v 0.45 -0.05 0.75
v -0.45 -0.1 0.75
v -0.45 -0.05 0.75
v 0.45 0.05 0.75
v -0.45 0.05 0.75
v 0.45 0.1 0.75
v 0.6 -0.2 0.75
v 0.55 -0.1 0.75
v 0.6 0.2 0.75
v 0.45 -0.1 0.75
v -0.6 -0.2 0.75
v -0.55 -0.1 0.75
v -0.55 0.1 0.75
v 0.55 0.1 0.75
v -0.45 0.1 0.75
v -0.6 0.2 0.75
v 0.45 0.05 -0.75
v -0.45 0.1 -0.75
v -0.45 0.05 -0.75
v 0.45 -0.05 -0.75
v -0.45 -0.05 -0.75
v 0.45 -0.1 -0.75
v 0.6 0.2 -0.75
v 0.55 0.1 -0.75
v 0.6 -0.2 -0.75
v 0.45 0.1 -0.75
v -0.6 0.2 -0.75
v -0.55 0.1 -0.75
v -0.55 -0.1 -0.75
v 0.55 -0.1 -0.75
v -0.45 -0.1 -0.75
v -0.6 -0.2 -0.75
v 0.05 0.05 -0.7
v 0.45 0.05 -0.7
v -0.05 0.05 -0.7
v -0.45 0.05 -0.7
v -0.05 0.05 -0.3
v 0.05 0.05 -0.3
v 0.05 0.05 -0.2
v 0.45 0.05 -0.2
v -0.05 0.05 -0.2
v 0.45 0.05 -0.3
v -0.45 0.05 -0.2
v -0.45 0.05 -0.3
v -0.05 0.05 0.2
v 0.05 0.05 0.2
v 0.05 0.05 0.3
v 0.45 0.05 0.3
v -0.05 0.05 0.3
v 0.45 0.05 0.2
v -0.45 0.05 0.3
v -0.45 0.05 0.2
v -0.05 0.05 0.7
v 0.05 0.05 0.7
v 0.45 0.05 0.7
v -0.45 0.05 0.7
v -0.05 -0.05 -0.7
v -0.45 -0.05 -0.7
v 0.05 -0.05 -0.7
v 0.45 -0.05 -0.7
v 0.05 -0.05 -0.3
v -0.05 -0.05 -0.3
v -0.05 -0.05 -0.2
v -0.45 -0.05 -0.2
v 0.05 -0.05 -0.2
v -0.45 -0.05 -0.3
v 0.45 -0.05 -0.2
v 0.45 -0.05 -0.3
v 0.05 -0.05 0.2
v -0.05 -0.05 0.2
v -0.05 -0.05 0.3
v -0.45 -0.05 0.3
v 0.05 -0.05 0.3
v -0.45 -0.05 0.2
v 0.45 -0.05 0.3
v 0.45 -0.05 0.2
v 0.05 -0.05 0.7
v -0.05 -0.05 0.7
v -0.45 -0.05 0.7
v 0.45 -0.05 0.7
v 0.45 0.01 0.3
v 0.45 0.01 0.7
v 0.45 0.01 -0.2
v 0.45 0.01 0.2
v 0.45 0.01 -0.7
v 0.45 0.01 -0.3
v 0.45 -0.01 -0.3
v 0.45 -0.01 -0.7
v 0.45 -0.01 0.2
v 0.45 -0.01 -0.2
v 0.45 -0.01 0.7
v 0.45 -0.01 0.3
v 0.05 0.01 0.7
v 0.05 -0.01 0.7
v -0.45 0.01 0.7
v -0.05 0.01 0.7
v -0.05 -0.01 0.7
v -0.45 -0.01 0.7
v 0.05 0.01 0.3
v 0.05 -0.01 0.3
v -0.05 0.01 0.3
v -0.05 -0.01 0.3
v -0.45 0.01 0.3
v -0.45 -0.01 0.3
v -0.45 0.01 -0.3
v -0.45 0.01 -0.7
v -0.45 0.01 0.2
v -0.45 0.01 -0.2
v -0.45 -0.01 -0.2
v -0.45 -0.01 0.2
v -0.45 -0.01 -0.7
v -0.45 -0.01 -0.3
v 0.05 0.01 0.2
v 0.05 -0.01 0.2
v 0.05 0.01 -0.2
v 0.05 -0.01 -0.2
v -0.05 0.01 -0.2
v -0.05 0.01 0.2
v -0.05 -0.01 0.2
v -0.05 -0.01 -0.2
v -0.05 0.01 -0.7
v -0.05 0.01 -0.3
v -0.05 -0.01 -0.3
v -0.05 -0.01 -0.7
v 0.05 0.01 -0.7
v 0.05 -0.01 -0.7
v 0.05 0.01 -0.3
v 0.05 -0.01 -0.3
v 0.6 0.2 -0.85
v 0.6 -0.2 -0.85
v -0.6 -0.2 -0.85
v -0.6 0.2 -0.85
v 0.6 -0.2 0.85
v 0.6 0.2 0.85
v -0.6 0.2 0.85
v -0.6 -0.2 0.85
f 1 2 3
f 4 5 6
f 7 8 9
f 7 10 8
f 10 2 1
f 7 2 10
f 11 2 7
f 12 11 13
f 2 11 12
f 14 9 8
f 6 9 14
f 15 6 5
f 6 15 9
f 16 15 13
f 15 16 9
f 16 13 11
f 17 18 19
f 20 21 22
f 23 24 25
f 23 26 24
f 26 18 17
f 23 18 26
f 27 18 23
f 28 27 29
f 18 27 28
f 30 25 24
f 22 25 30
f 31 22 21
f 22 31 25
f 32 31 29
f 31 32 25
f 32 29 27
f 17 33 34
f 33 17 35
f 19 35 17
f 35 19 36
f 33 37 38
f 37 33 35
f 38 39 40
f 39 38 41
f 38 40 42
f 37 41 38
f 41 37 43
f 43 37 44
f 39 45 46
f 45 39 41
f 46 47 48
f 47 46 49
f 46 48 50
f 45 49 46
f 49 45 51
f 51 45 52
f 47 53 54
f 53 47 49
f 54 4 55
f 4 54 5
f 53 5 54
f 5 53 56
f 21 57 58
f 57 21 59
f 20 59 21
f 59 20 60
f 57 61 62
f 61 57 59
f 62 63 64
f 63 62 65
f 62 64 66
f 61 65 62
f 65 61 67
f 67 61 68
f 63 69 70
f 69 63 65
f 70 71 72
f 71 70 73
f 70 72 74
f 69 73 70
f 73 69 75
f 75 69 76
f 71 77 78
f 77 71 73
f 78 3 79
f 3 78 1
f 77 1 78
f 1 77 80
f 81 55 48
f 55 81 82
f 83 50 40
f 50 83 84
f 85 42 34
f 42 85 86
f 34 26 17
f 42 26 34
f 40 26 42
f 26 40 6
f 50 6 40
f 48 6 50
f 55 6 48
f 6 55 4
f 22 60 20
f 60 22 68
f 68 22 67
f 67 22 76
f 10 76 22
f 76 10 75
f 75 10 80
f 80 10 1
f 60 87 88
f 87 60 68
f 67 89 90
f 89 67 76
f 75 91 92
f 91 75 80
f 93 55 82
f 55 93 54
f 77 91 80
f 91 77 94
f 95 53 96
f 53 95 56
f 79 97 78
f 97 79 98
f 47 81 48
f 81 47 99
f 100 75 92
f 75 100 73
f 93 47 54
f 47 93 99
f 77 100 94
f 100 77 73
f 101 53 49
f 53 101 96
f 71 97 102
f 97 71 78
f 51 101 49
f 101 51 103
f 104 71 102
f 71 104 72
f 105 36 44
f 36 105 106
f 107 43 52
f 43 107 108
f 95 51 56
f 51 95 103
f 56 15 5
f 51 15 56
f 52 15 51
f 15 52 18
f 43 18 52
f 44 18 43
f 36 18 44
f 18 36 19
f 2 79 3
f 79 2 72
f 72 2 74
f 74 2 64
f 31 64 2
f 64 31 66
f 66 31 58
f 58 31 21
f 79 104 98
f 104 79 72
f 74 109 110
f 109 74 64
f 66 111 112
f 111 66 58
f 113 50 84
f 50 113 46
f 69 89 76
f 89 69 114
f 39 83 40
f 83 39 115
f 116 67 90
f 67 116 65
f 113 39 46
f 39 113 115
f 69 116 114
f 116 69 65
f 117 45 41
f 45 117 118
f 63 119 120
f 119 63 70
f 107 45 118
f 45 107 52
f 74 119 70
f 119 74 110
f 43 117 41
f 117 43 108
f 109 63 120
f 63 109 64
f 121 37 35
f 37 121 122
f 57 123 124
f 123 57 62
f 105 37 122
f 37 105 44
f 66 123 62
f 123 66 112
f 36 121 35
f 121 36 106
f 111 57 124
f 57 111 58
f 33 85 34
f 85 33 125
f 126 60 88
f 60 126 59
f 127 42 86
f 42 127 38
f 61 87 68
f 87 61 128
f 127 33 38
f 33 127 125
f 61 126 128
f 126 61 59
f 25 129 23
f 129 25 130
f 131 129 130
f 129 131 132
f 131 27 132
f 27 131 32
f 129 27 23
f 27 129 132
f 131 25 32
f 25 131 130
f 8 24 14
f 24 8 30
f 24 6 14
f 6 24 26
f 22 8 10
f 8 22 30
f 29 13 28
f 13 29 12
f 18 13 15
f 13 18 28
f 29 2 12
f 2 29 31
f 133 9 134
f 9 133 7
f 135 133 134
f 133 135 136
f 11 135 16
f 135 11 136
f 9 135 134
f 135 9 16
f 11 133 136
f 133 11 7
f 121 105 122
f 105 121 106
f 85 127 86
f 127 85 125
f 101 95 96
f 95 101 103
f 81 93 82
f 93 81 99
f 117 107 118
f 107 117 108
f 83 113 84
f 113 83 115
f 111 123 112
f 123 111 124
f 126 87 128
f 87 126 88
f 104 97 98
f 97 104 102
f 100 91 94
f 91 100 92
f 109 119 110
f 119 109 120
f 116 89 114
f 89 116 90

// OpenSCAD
module Window_01(){  
    color("#A1662F"){
    difference(){

        cube([1,0.1,1.5],center = true);

        translate([0.25,0,0.5])
        cube([0.4,0.2,0.4],center = true);

        translate([-0.25,0,0.5])
        cube([0.4,0.2,0.4],center = true);

        translate([0.25,0,0])
        cube([0.4,0.2,0.4],center = true);

        translate([-0.25,0,0])
        cube([0.4,0.2,0.4],center = true);

        translate([-0.25,0,-0.5])
        cube([0.4,0.2,0.4],center = true);


        translate([0.25,0,-0.5])
        cube([0.4,0.2,0.4],center = true);

        
    }

    translate([0,0,-0.8])
    cube([1.2,0.4,0.1],center = true);


    translate([0.5,0,-0])
    cube([0.1,0.2,1.5],center = true);


    translate([-0.5,0,-0])
    cube([0.1,0.2,1.5],center = true);


    translate([-0,0,0.8])
    cube([1.2,0.4,0.1],center = true);
    
    }
    color("#a7c7cb"){
    cube([1,0.02,1.4],center = true);
    }
}


Window_01();
